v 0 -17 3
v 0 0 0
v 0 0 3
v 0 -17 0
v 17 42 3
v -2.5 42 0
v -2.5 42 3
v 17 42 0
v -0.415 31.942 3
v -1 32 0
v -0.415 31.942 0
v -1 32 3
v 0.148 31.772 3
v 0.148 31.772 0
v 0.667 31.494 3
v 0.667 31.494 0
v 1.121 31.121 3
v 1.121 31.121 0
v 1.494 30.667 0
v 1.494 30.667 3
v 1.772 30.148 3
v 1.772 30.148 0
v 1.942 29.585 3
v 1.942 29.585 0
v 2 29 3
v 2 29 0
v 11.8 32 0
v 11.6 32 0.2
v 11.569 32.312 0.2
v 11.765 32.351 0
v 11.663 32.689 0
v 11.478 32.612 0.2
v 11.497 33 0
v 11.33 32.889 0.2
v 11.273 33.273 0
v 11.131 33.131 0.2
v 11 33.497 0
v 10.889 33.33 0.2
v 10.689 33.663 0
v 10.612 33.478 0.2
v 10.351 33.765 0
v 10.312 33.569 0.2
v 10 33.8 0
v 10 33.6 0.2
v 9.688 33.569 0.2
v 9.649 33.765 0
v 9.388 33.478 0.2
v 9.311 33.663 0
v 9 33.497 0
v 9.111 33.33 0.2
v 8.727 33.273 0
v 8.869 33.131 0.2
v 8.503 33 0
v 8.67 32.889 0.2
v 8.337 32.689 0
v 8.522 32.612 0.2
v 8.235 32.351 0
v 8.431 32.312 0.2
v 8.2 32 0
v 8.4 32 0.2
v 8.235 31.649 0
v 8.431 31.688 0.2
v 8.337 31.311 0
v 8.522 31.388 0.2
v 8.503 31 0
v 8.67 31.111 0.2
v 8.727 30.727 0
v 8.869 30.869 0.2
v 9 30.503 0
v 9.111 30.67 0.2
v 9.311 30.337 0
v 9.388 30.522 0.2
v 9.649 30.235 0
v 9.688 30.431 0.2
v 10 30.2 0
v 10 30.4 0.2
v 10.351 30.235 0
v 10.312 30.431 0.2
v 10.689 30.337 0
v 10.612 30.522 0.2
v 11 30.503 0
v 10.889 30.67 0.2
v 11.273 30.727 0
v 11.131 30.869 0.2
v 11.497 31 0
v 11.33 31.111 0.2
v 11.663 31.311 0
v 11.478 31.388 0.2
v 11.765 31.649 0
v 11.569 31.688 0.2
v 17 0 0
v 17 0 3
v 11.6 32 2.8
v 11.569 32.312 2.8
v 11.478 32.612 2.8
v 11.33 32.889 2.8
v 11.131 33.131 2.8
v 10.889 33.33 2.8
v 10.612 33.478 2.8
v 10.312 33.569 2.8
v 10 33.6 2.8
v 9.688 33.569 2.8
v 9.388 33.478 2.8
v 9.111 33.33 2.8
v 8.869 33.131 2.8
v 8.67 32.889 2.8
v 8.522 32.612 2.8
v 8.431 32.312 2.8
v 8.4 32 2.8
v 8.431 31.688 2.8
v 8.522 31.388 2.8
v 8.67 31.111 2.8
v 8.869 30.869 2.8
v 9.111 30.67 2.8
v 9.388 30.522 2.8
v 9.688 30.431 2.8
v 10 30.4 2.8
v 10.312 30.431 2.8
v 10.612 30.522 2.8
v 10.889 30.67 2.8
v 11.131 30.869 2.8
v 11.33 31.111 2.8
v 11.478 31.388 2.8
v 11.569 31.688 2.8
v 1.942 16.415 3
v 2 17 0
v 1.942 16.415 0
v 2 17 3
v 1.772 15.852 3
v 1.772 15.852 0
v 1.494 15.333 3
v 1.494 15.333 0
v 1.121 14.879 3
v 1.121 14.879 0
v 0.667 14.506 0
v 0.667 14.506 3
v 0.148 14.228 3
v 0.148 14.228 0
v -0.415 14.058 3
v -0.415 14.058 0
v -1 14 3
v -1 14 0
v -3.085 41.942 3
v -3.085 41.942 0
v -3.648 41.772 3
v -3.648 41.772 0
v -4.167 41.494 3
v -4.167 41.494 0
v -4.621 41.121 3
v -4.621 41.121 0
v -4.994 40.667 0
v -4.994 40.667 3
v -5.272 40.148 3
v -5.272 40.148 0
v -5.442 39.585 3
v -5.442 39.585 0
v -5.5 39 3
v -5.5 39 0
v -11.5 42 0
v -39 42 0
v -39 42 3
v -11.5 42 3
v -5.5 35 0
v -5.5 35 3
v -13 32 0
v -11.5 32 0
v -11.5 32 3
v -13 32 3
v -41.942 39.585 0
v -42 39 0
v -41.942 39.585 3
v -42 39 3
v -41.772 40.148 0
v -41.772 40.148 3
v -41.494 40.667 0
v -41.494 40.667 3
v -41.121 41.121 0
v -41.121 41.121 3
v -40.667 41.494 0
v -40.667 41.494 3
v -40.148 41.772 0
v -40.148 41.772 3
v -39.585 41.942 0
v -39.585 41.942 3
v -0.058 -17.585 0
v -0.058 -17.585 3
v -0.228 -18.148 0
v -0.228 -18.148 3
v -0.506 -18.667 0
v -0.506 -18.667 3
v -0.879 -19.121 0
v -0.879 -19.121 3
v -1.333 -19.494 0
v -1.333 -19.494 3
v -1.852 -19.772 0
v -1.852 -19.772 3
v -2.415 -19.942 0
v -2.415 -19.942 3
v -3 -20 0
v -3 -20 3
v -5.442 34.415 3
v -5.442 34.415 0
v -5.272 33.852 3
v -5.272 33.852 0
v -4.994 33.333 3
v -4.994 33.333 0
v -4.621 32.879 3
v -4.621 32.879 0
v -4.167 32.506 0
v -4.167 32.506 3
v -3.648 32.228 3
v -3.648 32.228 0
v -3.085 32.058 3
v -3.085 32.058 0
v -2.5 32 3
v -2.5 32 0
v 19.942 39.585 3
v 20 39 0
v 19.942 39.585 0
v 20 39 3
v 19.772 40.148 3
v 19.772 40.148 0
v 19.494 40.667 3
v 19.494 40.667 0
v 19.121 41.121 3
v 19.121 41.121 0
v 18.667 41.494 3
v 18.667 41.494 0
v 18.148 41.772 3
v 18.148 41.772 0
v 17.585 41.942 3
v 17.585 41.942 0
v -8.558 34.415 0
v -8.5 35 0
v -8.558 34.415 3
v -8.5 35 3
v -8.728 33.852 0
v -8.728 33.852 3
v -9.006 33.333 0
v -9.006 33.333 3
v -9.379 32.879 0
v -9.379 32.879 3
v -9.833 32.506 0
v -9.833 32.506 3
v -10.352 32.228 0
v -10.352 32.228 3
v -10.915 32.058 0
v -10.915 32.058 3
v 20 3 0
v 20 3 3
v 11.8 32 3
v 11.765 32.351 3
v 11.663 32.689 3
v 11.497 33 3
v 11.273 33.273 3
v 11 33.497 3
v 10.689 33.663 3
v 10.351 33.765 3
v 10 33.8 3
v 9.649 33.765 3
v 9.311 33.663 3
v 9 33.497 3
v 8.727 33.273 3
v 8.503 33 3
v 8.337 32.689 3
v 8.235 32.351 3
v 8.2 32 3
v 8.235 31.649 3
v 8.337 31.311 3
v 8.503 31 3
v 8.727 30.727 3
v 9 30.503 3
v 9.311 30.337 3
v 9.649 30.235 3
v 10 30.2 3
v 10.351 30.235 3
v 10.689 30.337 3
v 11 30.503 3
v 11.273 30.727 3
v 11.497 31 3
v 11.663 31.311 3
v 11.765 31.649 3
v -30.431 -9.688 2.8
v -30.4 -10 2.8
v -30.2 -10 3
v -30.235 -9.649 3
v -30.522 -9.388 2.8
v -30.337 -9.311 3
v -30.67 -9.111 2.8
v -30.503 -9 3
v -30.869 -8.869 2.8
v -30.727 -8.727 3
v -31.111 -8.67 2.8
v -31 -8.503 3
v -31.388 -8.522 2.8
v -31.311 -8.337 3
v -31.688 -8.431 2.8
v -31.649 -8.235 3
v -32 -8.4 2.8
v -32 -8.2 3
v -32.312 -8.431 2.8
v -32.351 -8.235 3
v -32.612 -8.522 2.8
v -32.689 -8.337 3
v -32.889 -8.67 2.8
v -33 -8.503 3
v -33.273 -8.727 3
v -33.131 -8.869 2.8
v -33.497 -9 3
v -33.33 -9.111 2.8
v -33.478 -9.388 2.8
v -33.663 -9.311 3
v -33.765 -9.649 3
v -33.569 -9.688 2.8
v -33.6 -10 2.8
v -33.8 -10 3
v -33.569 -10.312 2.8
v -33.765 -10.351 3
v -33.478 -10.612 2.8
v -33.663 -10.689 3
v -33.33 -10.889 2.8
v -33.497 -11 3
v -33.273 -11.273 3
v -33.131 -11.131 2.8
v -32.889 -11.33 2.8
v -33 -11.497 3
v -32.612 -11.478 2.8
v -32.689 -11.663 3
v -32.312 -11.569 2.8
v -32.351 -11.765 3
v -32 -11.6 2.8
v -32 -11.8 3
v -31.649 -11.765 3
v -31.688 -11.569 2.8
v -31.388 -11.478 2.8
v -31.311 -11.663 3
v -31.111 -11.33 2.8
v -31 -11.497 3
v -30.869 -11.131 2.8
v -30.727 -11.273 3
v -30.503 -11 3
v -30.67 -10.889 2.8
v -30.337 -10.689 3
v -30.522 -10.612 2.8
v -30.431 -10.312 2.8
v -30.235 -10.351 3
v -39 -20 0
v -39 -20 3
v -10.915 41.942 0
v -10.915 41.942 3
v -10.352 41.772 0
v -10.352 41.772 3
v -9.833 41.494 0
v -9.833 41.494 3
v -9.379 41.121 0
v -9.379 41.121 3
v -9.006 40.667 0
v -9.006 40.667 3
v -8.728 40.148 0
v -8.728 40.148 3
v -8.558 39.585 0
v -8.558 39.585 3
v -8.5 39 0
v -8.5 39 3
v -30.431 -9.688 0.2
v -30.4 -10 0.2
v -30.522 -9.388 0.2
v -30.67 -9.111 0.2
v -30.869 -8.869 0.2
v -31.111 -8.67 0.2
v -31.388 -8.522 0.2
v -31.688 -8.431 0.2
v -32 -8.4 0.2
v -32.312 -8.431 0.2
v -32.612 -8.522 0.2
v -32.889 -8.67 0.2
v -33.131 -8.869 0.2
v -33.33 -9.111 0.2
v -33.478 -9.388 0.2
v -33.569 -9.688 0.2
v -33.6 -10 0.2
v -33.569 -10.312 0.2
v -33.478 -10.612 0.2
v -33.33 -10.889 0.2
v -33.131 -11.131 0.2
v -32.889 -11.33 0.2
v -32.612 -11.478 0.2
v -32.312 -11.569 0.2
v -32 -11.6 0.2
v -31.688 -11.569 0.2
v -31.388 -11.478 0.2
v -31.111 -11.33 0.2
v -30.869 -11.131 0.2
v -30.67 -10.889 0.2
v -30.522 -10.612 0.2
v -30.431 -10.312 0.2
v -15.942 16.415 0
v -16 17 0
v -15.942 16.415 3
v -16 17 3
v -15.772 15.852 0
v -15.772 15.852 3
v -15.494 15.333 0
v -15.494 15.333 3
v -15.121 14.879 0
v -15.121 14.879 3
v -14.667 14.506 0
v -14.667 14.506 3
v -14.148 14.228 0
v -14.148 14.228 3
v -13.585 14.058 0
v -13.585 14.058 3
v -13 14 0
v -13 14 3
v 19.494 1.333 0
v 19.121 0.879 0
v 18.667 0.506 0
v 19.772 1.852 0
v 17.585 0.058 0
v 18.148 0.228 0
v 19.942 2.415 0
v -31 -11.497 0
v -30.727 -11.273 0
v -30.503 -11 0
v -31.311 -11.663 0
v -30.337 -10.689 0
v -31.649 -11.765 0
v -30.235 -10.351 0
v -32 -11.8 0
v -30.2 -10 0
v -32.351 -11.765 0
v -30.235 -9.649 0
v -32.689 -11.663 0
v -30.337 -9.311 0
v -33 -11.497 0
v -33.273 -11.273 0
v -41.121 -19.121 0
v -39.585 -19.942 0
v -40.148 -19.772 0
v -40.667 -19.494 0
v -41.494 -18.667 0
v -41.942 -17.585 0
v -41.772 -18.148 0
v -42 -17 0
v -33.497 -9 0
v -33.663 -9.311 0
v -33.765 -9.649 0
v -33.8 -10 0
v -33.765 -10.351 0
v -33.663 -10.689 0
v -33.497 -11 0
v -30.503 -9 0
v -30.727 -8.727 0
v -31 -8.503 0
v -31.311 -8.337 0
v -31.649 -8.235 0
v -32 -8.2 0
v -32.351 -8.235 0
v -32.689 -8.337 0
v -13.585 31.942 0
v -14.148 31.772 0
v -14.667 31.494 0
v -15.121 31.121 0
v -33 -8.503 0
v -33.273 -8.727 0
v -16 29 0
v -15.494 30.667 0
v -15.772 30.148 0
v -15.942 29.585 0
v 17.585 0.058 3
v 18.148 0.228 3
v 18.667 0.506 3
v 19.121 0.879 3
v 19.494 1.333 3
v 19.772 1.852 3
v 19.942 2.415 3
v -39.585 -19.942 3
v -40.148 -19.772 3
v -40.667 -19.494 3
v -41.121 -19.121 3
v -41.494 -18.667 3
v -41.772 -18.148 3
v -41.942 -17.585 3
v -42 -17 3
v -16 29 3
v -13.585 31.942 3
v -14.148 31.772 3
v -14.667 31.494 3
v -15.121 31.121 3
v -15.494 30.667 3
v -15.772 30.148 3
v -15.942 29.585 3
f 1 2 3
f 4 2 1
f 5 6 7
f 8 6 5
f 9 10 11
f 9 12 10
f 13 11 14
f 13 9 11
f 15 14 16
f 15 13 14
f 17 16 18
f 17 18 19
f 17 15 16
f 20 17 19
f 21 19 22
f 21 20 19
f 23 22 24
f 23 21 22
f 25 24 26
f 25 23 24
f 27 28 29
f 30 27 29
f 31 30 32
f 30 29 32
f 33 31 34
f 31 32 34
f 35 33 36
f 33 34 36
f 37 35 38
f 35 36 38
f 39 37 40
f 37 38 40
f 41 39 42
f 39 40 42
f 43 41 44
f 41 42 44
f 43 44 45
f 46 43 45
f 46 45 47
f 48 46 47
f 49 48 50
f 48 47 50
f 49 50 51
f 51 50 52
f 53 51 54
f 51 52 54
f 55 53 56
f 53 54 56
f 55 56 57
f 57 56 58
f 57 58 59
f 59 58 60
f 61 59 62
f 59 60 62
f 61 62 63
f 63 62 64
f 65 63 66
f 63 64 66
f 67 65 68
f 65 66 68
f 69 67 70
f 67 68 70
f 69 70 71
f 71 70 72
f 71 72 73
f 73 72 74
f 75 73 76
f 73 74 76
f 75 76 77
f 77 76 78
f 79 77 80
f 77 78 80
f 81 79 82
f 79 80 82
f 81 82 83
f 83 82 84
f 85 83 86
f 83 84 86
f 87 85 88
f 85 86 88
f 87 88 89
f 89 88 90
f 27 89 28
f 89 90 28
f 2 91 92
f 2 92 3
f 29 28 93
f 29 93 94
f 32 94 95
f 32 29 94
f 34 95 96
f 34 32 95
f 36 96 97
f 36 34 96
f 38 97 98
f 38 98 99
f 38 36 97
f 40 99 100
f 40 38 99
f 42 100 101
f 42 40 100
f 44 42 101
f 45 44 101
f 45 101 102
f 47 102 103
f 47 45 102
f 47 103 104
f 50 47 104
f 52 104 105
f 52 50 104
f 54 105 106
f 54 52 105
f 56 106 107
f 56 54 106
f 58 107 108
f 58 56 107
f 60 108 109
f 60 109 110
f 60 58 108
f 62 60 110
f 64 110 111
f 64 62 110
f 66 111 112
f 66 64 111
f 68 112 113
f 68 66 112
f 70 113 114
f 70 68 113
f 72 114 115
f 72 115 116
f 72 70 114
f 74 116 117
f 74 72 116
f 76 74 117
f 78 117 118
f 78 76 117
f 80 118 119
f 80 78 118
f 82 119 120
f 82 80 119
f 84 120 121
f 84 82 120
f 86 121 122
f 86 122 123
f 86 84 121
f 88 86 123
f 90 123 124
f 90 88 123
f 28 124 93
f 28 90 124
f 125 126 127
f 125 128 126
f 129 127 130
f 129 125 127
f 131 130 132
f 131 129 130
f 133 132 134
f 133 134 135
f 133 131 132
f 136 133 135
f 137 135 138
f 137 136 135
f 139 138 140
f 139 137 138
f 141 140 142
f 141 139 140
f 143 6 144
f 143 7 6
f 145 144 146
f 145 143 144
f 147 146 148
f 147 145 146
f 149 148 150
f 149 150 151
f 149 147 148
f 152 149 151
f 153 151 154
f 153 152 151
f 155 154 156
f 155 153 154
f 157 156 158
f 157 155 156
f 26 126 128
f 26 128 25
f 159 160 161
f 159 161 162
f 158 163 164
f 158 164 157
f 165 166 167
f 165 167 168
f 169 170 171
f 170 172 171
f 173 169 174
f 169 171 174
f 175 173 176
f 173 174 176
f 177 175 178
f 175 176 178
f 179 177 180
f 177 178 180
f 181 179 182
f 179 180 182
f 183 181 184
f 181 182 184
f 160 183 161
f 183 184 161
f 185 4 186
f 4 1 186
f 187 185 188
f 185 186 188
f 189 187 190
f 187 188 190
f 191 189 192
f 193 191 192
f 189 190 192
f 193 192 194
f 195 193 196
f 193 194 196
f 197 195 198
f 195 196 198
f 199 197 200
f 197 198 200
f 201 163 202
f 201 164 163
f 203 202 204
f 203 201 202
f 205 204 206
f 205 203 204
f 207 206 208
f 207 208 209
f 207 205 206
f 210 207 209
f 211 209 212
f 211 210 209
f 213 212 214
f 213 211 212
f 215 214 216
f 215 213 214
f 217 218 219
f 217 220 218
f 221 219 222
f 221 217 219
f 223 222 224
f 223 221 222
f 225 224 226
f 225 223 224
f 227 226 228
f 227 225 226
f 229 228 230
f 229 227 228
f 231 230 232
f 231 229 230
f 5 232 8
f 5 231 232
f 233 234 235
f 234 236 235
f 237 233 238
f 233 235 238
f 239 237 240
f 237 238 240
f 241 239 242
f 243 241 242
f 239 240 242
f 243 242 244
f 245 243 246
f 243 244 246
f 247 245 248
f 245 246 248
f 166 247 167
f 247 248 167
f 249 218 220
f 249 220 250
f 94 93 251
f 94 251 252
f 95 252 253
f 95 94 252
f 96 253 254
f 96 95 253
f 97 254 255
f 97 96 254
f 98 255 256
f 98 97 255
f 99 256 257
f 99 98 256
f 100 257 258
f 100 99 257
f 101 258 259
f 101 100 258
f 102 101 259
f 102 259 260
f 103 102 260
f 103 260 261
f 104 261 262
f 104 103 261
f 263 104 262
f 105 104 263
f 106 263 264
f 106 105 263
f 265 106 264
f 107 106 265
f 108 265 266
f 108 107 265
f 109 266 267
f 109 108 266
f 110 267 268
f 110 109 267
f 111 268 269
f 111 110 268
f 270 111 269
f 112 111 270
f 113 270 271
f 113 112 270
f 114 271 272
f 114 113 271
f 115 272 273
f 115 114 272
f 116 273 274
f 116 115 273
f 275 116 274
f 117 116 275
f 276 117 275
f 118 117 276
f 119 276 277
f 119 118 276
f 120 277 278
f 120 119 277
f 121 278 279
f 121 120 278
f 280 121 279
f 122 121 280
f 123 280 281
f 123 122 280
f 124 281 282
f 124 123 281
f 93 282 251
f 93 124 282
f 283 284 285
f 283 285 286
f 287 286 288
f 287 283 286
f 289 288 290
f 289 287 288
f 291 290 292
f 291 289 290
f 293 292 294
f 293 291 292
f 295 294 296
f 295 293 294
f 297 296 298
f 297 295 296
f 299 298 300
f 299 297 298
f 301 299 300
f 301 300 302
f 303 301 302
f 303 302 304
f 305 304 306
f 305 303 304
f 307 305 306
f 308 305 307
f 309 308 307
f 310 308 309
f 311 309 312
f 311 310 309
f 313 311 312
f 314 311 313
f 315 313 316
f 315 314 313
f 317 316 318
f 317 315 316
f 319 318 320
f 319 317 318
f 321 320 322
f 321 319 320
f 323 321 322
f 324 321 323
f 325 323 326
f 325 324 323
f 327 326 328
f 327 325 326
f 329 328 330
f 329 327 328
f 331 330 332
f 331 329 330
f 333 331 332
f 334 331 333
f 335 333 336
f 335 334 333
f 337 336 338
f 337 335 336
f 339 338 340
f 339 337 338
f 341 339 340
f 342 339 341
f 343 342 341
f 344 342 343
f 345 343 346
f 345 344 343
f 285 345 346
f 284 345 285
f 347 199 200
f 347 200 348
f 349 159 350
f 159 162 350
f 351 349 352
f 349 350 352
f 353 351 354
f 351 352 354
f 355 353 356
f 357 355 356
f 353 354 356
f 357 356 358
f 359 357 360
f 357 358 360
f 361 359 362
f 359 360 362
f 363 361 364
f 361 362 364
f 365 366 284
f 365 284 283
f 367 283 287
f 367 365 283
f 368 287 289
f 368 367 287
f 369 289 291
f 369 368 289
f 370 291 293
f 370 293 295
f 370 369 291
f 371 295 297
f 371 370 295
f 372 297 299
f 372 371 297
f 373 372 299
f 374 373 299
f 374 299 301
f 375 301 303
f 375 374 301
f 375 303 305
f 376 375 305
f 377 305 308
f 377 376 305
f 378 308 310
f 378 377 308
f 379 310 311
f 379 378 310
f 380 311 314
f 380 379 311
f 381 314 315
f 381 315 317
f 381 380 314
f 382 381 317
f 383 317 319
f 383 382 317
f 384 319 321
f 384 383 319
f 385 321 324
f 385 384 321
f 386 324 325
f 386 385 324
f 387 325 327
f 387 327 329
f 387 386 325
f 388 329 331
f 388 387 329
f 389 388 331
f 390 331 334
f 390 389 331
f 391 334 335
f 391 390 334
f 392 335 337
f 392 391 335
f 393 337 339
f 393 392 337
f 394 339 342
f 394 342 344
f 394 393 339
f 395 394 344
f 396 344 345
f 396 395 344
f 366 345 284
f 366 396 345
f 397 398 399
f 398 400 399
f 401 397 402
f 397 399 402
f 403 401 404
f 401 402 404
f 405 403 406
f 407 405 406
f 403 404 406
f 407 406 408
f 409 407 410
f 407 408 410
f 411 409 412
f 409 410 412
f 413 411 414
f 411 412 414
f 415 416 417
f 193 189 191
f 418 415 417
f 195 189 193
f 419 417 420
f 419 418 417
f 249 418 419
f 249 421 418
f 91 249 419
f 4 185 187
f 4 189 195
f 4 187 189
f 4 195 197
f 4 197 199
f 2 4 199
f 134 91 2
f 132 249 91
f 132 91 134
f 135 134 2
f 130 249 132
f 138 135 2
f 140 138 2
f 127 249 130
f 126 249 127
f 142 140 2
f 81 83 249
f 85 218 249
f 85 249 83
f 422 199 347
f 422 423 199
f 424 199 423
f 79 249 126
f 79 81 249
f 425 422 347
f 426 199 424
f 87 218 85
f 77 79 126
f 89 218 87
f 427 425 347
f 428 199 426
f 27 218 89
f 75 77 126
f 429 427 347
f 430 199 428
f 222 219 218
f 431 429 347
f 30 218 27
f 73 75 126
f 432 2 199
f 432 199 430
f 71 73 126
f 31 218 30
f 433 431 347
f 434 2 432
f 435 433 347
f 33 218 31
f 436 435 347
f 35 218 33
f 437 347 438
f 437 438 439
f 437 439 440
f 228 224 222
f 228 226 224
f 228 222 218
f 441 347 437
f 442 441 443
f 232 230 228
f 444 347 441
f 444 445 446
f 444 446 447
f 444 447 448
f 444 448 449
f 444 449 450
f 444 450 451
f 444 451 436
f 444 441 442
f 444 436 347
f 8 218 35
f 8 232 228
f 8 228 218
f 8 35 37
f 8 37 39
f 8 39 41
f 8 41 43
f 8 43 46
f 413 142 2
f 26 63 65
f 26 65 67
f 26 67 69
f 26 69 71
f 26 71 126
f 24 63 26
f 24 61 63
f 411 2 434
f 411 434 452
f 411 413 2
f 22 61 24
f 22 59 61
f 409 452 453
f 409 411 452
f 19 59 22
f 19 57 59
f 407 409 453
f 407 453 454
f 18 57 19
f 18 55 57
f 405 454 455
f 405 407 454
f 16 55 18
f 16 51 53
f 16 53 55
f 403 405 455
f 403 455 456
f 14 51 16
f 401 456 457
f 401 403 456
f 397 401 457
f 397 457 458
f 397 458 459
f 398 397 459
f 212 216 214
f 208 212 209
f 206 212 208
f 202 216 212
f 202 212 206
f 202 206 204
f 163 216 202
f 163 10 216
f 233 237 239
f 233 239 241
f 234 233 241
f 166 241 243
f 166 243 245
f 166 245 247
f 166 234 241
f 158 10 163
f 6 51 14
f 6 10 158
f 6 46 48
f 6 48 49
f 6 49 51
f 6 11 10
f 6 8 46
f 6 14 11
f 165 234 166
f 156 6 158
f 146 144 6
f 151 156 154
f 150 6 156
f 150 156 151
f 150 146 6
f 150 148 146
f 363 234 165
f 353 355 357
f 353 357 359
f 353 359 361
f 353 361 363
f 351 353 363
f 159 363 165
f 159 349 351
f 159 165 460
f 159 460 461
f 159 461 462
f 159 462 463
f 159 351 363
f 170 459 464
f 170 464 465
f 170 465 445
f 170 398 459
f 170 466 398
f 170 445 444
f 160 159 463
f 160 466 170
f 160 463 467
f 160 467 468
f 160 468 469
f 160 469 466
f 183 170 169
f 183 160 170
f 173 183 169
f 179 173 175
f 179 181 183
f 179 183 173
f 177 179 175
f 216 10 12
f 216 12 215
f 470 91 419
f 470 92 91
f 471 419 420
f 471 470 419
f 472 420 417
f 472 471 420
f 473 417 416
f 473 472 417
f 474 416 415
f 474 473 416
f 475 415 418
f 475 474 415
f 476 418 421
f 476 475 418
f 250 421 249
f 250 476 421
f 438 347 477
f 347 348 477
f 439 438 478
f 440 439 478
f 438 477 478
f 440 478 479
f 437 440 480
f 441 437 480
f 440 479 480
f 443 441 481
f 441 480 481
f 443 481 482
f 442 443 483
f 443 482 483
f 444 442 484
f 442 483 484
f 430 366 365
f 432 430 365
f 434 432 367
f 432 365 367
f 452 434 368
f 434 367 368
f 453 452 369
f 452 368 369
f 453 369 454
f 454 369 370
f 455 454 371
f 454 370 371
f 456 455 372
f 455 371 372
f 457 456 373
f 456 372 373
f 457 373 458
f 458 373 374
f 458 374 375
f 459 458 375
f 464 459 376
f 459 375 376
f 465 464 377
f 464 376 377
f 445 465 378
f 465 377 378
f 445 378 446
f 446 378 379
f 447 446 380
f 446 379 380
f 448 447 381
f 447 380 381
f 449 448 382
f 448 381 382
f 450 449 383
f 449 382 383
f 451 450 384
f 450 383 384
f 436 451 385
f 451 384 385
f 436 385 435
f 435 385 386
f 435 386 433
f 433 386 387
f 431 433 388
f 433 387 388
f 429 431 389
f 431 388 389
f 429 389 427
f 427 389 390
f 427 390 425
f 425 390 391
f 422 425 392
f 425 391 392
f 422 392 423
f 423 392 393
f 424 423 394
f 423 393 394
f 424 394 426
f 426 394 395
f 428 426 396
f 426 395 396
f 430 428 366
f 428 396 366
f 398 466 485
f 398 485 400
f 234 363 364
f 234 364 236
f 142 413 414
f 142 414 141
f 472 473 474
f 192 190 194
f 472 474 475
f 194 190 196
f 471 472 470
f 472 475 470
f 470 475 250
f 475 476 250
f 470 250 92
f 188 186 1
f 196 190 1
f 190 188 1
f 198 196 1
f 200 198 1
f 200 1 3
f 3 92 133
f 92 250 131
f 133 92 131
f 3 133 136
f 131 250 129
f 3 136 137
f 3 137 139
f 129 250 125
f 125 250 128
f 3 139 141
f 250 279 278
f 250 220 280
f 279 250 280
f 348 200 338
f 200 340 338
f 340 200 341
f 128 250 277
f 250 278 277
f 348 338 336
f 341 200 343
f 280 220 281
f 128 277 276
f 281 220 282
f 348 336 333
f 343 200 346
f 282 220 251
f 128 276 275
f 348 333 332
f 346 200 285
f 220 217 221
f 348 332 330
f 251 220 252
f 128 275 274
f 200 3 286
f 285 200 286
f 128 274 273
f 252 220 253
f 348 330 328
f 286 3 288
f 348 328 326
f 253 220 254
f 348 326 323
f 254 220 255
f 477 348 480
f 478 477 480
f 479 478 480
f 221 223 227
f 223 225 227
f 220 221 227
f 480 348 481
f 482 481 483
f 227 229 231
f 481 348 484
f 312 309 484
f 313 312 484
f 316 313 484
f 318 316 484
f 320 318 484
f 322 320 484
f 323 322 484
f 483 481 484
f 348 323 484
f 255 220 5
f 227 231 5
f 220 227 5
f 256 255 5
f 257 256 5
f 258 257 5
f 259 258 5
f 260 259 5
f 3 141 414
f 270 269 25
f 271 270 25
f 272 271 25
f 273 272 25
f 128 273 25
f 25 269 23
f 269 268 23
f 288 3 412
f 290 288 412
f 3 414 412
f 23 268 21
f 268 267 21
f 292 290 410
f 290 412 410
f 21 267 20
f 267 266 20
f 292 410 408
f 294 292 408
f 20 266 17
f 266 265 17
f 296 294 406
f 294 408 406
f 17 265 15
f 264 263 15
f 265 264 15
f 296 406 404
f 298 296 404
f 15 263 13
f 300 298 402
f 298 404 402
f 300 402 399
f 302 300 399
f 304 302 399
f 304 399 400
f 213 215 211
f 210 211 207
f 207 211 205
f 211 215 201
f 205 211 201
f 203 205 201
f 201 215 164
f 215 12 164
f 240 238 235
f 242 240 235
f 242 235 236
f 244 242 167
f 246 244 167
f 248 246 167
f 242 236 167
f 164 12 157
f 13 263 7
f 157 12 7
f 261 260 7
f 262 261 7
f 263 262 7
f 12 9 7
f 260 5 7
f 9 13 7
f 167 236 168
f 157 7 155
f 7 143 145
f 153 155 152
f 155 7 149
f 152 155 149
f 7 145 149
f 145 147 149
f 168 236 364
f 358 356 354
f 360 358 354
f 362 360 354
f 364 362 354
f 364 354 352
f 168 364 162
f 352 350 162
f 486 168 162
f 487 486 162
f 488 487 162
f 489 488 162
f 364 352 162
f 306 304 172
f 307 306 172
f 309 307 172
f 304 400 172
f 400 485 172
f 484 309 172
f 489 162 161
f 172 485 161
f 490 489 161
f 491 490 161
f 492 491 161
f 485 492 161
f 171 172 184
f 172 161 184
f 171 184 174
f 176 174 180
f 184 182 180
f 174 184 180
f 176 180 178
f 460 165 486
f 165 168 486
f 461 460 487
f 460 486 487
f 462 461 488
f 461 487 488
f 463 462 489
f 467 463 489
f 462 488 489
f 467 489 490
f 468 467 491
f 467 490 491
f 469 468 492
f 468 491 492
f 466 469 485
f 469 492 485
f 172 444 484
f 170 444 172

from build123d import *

# Parameters (mm, degrees)
SKETCH_R     = 1.6
PAD_DEPTH    = 3
FILLET_R     = 3
CHAMFER_SIZE = 0.2


with BuildPart() as part:
    # Sketch → Pad (new body)
    with BuildSketch(Plane.XY):
        Polygon((0, 0), (0, -20), (-42, -20), (-42, 42), (-8.5, 42), (-8.5, 32), (-16, 32), (-16, 14), (2, 14), (2, 32), (-5.5, 32), (-5.5, 42), (20, 42), (20, 0), align=None)
        with Locations((10, 32)):
            Circle(SKETCH_R, mode=Mode.SUBTRACT)
        with Locations((-32, -10)):
            Circle(SKETCH_R, mode=Mode.SUBTRACT)
    extrude(amount=PAD_DEPTH)

    # Fillet
    fillet_edges = [part.edges().sort_by_distance(p)[0] for p in [
        (-42, -20, 1.5),
        (20, 0, 1.5),
        (0, -20, 1.5),
        (-42, 42, 1.5),
        (20, 42, 1.5),
        (-5.5, 32, 1.5),
        (-5.5, 42, 1.5),
        (2, 32, 1.5),
        (-8.5, 32, 1.5),
        (-16, 32, 1.5),
        (-16, 14, 1.5),
        (2, 14, 1.5),
        (-8.5, 42, 1.5),
    ]]
    fillet(fillet_edges, radius=FILLET_R)

    # Chamfer
    chamfer_edges = [part.edges().sort_by_distance(p)[0] for p in [
        (-33.6, -10, 0),
        (8.4, 32, 0),
        (-33.6, -10, 3),
        (8.4, 32, 3),
    ]]
    chamfer(chamfer_edges, length=CHAMFER_SIZE)


solid = part.part
